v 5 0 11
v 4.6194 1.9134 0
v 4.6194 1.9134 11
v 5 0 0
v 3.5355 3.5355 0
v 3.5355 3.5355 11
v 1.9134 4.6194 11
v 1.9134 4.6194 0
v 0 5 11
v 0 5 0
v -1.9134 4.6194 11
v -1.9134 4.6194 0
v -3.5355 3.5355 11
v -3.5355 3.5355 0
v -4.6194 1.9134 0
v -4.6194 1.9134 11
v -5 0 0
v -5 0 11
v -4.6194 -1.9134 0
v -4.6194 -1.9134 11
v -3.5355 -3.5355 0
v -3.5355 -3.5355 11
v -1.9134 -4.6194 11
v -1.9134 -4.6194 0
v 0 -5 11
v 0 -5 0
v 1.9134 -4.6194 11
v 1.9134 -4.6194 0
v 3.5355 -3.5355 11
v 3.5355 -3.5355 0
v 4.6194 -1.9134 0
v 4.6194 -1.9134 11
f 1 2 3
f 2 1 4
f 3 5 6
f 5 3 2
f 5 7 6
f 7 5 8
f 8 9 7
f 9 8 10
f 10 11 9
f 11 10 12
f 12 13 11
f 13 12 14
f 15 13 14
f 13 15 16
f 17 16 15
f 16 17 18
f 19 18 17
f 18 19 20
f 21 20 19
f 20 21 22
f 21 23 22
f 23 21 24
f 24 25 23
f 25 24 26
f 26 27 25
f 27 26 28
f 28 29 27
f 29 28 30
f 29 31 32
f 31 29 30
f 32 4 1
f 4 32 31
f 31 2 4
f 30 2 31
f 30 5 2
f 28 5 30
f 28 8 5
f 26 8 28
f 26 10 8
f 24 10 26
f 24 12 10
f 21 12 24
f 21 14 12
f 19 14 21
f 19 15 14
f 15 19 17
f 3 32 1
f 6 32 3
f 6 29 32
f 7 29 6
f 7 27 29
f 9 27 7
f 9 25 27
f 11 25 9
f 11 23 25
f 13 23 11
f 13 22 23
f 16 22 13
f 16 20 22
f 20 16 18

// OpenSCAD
// Generated by SolidPython 1.0.1 on 2020-07-29 00:46:44


cylinder(h = 11, r1 = 5, r2 = 5);
/***********************************************
*********      SolidPython code:      **********
************************************************
 
# import packages: SolidPython
from solid import *
from solid.utils import *
from itertools import chain, combinations, permutations


class Resize:

    def __init__(self, scad_file):
        self.scad_file = scad_file
        #self.scad_file = import_scad(scad_file)
        # cone/cylinder param:
        self.r1 = 0
        self.r2 = 0
        self.h = 0
        # rectangular prism param:
        self.w = 0
        self.l = 0
        # ellipse param:
        self.r = 0

    # import OpenScad code (file name corresponds to shape)


    # classify shape + parameters
    def assign(self, param1, param2, param3):
        if self.scad_file == 'cone.scad':
            self.r1 = param1
            self.r2 = param2
            self.h = param3
        elif self.scad_file == 'cylinder.scad':
            self.r1 = param1
            self.r2 = param2
            self.h = param3
        elif self.scad_file == 'rectangularPrism.scad':
            self.h = param1
            self.l = param2
            self.w = param3
        else:
            self.r = param1
            self.h = param2

    # resize parameters
    def iterate(self):
        x = range(3, 20, 2)
        i = 1
        if self.scad_file == 'cone.scad':
            tempList = list(permutations(x, 2))
            for temp in tempList:
                param1 = temp[0]
                param2 = temp[1]
                filepath = 'produced_scad_files/' + 'cone' + str(param1) + '_' + str(param2) + '_' + '.scad'
                scad_render_to_file(cylinder(h=param1, r1=param2, r2=0), filepath)

        elif self.scad_file == 'cylinder.scad':
            tempList = list(permutations(x, 3))
            for temp in tempList:
                param1 = temp[0]
                param2 = temp[1]
                filepath = 'produced_scad_files/' + 'cylinder' + str(param1) + '_' + str(param2) + '_' + '.scad'
                scad_render_to_file(cylinder(h=param1, r1=param2, r2=param2), filepath)

        elif self.scad_file == 'rectangularPrism.scad':
            tempList = list(permutations(x, 3))
            for temp in tempList:
                param1 = temp[0]
                param2 = temp[1]
                param3 = temp[2]
                filepath = 'produced_scad_files/' + 'rectangularPrism' + str(param1) + '_' + str(param2) + '_' + str(
                    param3) + '.scad'
                scad_render_to_file(cube(size=(param1, param2, param3)), filepath)

        elif self.scad_file == 'ellipse.scad':
            tempList = list(permutations(x, 4))
            for temp in tempList:
                param1 = temp[0]
                param2 = temp[1]
                param3 = temp[2]
                param4 = temp[3]
                filepath = 'produced_scad_files/' + 'ellipse' + str(param1) + '_' + str(param2) + '_' + str(param3) + '_' + str(param4) + '.scad'
                scad_render_to_file(scale([param1, param2, param3])(sphere(r=param4)), filepath)

    def render_to_scadfile(self):
        scad_render_to_file(scad, 'example.scad') 
 
************************************************/
